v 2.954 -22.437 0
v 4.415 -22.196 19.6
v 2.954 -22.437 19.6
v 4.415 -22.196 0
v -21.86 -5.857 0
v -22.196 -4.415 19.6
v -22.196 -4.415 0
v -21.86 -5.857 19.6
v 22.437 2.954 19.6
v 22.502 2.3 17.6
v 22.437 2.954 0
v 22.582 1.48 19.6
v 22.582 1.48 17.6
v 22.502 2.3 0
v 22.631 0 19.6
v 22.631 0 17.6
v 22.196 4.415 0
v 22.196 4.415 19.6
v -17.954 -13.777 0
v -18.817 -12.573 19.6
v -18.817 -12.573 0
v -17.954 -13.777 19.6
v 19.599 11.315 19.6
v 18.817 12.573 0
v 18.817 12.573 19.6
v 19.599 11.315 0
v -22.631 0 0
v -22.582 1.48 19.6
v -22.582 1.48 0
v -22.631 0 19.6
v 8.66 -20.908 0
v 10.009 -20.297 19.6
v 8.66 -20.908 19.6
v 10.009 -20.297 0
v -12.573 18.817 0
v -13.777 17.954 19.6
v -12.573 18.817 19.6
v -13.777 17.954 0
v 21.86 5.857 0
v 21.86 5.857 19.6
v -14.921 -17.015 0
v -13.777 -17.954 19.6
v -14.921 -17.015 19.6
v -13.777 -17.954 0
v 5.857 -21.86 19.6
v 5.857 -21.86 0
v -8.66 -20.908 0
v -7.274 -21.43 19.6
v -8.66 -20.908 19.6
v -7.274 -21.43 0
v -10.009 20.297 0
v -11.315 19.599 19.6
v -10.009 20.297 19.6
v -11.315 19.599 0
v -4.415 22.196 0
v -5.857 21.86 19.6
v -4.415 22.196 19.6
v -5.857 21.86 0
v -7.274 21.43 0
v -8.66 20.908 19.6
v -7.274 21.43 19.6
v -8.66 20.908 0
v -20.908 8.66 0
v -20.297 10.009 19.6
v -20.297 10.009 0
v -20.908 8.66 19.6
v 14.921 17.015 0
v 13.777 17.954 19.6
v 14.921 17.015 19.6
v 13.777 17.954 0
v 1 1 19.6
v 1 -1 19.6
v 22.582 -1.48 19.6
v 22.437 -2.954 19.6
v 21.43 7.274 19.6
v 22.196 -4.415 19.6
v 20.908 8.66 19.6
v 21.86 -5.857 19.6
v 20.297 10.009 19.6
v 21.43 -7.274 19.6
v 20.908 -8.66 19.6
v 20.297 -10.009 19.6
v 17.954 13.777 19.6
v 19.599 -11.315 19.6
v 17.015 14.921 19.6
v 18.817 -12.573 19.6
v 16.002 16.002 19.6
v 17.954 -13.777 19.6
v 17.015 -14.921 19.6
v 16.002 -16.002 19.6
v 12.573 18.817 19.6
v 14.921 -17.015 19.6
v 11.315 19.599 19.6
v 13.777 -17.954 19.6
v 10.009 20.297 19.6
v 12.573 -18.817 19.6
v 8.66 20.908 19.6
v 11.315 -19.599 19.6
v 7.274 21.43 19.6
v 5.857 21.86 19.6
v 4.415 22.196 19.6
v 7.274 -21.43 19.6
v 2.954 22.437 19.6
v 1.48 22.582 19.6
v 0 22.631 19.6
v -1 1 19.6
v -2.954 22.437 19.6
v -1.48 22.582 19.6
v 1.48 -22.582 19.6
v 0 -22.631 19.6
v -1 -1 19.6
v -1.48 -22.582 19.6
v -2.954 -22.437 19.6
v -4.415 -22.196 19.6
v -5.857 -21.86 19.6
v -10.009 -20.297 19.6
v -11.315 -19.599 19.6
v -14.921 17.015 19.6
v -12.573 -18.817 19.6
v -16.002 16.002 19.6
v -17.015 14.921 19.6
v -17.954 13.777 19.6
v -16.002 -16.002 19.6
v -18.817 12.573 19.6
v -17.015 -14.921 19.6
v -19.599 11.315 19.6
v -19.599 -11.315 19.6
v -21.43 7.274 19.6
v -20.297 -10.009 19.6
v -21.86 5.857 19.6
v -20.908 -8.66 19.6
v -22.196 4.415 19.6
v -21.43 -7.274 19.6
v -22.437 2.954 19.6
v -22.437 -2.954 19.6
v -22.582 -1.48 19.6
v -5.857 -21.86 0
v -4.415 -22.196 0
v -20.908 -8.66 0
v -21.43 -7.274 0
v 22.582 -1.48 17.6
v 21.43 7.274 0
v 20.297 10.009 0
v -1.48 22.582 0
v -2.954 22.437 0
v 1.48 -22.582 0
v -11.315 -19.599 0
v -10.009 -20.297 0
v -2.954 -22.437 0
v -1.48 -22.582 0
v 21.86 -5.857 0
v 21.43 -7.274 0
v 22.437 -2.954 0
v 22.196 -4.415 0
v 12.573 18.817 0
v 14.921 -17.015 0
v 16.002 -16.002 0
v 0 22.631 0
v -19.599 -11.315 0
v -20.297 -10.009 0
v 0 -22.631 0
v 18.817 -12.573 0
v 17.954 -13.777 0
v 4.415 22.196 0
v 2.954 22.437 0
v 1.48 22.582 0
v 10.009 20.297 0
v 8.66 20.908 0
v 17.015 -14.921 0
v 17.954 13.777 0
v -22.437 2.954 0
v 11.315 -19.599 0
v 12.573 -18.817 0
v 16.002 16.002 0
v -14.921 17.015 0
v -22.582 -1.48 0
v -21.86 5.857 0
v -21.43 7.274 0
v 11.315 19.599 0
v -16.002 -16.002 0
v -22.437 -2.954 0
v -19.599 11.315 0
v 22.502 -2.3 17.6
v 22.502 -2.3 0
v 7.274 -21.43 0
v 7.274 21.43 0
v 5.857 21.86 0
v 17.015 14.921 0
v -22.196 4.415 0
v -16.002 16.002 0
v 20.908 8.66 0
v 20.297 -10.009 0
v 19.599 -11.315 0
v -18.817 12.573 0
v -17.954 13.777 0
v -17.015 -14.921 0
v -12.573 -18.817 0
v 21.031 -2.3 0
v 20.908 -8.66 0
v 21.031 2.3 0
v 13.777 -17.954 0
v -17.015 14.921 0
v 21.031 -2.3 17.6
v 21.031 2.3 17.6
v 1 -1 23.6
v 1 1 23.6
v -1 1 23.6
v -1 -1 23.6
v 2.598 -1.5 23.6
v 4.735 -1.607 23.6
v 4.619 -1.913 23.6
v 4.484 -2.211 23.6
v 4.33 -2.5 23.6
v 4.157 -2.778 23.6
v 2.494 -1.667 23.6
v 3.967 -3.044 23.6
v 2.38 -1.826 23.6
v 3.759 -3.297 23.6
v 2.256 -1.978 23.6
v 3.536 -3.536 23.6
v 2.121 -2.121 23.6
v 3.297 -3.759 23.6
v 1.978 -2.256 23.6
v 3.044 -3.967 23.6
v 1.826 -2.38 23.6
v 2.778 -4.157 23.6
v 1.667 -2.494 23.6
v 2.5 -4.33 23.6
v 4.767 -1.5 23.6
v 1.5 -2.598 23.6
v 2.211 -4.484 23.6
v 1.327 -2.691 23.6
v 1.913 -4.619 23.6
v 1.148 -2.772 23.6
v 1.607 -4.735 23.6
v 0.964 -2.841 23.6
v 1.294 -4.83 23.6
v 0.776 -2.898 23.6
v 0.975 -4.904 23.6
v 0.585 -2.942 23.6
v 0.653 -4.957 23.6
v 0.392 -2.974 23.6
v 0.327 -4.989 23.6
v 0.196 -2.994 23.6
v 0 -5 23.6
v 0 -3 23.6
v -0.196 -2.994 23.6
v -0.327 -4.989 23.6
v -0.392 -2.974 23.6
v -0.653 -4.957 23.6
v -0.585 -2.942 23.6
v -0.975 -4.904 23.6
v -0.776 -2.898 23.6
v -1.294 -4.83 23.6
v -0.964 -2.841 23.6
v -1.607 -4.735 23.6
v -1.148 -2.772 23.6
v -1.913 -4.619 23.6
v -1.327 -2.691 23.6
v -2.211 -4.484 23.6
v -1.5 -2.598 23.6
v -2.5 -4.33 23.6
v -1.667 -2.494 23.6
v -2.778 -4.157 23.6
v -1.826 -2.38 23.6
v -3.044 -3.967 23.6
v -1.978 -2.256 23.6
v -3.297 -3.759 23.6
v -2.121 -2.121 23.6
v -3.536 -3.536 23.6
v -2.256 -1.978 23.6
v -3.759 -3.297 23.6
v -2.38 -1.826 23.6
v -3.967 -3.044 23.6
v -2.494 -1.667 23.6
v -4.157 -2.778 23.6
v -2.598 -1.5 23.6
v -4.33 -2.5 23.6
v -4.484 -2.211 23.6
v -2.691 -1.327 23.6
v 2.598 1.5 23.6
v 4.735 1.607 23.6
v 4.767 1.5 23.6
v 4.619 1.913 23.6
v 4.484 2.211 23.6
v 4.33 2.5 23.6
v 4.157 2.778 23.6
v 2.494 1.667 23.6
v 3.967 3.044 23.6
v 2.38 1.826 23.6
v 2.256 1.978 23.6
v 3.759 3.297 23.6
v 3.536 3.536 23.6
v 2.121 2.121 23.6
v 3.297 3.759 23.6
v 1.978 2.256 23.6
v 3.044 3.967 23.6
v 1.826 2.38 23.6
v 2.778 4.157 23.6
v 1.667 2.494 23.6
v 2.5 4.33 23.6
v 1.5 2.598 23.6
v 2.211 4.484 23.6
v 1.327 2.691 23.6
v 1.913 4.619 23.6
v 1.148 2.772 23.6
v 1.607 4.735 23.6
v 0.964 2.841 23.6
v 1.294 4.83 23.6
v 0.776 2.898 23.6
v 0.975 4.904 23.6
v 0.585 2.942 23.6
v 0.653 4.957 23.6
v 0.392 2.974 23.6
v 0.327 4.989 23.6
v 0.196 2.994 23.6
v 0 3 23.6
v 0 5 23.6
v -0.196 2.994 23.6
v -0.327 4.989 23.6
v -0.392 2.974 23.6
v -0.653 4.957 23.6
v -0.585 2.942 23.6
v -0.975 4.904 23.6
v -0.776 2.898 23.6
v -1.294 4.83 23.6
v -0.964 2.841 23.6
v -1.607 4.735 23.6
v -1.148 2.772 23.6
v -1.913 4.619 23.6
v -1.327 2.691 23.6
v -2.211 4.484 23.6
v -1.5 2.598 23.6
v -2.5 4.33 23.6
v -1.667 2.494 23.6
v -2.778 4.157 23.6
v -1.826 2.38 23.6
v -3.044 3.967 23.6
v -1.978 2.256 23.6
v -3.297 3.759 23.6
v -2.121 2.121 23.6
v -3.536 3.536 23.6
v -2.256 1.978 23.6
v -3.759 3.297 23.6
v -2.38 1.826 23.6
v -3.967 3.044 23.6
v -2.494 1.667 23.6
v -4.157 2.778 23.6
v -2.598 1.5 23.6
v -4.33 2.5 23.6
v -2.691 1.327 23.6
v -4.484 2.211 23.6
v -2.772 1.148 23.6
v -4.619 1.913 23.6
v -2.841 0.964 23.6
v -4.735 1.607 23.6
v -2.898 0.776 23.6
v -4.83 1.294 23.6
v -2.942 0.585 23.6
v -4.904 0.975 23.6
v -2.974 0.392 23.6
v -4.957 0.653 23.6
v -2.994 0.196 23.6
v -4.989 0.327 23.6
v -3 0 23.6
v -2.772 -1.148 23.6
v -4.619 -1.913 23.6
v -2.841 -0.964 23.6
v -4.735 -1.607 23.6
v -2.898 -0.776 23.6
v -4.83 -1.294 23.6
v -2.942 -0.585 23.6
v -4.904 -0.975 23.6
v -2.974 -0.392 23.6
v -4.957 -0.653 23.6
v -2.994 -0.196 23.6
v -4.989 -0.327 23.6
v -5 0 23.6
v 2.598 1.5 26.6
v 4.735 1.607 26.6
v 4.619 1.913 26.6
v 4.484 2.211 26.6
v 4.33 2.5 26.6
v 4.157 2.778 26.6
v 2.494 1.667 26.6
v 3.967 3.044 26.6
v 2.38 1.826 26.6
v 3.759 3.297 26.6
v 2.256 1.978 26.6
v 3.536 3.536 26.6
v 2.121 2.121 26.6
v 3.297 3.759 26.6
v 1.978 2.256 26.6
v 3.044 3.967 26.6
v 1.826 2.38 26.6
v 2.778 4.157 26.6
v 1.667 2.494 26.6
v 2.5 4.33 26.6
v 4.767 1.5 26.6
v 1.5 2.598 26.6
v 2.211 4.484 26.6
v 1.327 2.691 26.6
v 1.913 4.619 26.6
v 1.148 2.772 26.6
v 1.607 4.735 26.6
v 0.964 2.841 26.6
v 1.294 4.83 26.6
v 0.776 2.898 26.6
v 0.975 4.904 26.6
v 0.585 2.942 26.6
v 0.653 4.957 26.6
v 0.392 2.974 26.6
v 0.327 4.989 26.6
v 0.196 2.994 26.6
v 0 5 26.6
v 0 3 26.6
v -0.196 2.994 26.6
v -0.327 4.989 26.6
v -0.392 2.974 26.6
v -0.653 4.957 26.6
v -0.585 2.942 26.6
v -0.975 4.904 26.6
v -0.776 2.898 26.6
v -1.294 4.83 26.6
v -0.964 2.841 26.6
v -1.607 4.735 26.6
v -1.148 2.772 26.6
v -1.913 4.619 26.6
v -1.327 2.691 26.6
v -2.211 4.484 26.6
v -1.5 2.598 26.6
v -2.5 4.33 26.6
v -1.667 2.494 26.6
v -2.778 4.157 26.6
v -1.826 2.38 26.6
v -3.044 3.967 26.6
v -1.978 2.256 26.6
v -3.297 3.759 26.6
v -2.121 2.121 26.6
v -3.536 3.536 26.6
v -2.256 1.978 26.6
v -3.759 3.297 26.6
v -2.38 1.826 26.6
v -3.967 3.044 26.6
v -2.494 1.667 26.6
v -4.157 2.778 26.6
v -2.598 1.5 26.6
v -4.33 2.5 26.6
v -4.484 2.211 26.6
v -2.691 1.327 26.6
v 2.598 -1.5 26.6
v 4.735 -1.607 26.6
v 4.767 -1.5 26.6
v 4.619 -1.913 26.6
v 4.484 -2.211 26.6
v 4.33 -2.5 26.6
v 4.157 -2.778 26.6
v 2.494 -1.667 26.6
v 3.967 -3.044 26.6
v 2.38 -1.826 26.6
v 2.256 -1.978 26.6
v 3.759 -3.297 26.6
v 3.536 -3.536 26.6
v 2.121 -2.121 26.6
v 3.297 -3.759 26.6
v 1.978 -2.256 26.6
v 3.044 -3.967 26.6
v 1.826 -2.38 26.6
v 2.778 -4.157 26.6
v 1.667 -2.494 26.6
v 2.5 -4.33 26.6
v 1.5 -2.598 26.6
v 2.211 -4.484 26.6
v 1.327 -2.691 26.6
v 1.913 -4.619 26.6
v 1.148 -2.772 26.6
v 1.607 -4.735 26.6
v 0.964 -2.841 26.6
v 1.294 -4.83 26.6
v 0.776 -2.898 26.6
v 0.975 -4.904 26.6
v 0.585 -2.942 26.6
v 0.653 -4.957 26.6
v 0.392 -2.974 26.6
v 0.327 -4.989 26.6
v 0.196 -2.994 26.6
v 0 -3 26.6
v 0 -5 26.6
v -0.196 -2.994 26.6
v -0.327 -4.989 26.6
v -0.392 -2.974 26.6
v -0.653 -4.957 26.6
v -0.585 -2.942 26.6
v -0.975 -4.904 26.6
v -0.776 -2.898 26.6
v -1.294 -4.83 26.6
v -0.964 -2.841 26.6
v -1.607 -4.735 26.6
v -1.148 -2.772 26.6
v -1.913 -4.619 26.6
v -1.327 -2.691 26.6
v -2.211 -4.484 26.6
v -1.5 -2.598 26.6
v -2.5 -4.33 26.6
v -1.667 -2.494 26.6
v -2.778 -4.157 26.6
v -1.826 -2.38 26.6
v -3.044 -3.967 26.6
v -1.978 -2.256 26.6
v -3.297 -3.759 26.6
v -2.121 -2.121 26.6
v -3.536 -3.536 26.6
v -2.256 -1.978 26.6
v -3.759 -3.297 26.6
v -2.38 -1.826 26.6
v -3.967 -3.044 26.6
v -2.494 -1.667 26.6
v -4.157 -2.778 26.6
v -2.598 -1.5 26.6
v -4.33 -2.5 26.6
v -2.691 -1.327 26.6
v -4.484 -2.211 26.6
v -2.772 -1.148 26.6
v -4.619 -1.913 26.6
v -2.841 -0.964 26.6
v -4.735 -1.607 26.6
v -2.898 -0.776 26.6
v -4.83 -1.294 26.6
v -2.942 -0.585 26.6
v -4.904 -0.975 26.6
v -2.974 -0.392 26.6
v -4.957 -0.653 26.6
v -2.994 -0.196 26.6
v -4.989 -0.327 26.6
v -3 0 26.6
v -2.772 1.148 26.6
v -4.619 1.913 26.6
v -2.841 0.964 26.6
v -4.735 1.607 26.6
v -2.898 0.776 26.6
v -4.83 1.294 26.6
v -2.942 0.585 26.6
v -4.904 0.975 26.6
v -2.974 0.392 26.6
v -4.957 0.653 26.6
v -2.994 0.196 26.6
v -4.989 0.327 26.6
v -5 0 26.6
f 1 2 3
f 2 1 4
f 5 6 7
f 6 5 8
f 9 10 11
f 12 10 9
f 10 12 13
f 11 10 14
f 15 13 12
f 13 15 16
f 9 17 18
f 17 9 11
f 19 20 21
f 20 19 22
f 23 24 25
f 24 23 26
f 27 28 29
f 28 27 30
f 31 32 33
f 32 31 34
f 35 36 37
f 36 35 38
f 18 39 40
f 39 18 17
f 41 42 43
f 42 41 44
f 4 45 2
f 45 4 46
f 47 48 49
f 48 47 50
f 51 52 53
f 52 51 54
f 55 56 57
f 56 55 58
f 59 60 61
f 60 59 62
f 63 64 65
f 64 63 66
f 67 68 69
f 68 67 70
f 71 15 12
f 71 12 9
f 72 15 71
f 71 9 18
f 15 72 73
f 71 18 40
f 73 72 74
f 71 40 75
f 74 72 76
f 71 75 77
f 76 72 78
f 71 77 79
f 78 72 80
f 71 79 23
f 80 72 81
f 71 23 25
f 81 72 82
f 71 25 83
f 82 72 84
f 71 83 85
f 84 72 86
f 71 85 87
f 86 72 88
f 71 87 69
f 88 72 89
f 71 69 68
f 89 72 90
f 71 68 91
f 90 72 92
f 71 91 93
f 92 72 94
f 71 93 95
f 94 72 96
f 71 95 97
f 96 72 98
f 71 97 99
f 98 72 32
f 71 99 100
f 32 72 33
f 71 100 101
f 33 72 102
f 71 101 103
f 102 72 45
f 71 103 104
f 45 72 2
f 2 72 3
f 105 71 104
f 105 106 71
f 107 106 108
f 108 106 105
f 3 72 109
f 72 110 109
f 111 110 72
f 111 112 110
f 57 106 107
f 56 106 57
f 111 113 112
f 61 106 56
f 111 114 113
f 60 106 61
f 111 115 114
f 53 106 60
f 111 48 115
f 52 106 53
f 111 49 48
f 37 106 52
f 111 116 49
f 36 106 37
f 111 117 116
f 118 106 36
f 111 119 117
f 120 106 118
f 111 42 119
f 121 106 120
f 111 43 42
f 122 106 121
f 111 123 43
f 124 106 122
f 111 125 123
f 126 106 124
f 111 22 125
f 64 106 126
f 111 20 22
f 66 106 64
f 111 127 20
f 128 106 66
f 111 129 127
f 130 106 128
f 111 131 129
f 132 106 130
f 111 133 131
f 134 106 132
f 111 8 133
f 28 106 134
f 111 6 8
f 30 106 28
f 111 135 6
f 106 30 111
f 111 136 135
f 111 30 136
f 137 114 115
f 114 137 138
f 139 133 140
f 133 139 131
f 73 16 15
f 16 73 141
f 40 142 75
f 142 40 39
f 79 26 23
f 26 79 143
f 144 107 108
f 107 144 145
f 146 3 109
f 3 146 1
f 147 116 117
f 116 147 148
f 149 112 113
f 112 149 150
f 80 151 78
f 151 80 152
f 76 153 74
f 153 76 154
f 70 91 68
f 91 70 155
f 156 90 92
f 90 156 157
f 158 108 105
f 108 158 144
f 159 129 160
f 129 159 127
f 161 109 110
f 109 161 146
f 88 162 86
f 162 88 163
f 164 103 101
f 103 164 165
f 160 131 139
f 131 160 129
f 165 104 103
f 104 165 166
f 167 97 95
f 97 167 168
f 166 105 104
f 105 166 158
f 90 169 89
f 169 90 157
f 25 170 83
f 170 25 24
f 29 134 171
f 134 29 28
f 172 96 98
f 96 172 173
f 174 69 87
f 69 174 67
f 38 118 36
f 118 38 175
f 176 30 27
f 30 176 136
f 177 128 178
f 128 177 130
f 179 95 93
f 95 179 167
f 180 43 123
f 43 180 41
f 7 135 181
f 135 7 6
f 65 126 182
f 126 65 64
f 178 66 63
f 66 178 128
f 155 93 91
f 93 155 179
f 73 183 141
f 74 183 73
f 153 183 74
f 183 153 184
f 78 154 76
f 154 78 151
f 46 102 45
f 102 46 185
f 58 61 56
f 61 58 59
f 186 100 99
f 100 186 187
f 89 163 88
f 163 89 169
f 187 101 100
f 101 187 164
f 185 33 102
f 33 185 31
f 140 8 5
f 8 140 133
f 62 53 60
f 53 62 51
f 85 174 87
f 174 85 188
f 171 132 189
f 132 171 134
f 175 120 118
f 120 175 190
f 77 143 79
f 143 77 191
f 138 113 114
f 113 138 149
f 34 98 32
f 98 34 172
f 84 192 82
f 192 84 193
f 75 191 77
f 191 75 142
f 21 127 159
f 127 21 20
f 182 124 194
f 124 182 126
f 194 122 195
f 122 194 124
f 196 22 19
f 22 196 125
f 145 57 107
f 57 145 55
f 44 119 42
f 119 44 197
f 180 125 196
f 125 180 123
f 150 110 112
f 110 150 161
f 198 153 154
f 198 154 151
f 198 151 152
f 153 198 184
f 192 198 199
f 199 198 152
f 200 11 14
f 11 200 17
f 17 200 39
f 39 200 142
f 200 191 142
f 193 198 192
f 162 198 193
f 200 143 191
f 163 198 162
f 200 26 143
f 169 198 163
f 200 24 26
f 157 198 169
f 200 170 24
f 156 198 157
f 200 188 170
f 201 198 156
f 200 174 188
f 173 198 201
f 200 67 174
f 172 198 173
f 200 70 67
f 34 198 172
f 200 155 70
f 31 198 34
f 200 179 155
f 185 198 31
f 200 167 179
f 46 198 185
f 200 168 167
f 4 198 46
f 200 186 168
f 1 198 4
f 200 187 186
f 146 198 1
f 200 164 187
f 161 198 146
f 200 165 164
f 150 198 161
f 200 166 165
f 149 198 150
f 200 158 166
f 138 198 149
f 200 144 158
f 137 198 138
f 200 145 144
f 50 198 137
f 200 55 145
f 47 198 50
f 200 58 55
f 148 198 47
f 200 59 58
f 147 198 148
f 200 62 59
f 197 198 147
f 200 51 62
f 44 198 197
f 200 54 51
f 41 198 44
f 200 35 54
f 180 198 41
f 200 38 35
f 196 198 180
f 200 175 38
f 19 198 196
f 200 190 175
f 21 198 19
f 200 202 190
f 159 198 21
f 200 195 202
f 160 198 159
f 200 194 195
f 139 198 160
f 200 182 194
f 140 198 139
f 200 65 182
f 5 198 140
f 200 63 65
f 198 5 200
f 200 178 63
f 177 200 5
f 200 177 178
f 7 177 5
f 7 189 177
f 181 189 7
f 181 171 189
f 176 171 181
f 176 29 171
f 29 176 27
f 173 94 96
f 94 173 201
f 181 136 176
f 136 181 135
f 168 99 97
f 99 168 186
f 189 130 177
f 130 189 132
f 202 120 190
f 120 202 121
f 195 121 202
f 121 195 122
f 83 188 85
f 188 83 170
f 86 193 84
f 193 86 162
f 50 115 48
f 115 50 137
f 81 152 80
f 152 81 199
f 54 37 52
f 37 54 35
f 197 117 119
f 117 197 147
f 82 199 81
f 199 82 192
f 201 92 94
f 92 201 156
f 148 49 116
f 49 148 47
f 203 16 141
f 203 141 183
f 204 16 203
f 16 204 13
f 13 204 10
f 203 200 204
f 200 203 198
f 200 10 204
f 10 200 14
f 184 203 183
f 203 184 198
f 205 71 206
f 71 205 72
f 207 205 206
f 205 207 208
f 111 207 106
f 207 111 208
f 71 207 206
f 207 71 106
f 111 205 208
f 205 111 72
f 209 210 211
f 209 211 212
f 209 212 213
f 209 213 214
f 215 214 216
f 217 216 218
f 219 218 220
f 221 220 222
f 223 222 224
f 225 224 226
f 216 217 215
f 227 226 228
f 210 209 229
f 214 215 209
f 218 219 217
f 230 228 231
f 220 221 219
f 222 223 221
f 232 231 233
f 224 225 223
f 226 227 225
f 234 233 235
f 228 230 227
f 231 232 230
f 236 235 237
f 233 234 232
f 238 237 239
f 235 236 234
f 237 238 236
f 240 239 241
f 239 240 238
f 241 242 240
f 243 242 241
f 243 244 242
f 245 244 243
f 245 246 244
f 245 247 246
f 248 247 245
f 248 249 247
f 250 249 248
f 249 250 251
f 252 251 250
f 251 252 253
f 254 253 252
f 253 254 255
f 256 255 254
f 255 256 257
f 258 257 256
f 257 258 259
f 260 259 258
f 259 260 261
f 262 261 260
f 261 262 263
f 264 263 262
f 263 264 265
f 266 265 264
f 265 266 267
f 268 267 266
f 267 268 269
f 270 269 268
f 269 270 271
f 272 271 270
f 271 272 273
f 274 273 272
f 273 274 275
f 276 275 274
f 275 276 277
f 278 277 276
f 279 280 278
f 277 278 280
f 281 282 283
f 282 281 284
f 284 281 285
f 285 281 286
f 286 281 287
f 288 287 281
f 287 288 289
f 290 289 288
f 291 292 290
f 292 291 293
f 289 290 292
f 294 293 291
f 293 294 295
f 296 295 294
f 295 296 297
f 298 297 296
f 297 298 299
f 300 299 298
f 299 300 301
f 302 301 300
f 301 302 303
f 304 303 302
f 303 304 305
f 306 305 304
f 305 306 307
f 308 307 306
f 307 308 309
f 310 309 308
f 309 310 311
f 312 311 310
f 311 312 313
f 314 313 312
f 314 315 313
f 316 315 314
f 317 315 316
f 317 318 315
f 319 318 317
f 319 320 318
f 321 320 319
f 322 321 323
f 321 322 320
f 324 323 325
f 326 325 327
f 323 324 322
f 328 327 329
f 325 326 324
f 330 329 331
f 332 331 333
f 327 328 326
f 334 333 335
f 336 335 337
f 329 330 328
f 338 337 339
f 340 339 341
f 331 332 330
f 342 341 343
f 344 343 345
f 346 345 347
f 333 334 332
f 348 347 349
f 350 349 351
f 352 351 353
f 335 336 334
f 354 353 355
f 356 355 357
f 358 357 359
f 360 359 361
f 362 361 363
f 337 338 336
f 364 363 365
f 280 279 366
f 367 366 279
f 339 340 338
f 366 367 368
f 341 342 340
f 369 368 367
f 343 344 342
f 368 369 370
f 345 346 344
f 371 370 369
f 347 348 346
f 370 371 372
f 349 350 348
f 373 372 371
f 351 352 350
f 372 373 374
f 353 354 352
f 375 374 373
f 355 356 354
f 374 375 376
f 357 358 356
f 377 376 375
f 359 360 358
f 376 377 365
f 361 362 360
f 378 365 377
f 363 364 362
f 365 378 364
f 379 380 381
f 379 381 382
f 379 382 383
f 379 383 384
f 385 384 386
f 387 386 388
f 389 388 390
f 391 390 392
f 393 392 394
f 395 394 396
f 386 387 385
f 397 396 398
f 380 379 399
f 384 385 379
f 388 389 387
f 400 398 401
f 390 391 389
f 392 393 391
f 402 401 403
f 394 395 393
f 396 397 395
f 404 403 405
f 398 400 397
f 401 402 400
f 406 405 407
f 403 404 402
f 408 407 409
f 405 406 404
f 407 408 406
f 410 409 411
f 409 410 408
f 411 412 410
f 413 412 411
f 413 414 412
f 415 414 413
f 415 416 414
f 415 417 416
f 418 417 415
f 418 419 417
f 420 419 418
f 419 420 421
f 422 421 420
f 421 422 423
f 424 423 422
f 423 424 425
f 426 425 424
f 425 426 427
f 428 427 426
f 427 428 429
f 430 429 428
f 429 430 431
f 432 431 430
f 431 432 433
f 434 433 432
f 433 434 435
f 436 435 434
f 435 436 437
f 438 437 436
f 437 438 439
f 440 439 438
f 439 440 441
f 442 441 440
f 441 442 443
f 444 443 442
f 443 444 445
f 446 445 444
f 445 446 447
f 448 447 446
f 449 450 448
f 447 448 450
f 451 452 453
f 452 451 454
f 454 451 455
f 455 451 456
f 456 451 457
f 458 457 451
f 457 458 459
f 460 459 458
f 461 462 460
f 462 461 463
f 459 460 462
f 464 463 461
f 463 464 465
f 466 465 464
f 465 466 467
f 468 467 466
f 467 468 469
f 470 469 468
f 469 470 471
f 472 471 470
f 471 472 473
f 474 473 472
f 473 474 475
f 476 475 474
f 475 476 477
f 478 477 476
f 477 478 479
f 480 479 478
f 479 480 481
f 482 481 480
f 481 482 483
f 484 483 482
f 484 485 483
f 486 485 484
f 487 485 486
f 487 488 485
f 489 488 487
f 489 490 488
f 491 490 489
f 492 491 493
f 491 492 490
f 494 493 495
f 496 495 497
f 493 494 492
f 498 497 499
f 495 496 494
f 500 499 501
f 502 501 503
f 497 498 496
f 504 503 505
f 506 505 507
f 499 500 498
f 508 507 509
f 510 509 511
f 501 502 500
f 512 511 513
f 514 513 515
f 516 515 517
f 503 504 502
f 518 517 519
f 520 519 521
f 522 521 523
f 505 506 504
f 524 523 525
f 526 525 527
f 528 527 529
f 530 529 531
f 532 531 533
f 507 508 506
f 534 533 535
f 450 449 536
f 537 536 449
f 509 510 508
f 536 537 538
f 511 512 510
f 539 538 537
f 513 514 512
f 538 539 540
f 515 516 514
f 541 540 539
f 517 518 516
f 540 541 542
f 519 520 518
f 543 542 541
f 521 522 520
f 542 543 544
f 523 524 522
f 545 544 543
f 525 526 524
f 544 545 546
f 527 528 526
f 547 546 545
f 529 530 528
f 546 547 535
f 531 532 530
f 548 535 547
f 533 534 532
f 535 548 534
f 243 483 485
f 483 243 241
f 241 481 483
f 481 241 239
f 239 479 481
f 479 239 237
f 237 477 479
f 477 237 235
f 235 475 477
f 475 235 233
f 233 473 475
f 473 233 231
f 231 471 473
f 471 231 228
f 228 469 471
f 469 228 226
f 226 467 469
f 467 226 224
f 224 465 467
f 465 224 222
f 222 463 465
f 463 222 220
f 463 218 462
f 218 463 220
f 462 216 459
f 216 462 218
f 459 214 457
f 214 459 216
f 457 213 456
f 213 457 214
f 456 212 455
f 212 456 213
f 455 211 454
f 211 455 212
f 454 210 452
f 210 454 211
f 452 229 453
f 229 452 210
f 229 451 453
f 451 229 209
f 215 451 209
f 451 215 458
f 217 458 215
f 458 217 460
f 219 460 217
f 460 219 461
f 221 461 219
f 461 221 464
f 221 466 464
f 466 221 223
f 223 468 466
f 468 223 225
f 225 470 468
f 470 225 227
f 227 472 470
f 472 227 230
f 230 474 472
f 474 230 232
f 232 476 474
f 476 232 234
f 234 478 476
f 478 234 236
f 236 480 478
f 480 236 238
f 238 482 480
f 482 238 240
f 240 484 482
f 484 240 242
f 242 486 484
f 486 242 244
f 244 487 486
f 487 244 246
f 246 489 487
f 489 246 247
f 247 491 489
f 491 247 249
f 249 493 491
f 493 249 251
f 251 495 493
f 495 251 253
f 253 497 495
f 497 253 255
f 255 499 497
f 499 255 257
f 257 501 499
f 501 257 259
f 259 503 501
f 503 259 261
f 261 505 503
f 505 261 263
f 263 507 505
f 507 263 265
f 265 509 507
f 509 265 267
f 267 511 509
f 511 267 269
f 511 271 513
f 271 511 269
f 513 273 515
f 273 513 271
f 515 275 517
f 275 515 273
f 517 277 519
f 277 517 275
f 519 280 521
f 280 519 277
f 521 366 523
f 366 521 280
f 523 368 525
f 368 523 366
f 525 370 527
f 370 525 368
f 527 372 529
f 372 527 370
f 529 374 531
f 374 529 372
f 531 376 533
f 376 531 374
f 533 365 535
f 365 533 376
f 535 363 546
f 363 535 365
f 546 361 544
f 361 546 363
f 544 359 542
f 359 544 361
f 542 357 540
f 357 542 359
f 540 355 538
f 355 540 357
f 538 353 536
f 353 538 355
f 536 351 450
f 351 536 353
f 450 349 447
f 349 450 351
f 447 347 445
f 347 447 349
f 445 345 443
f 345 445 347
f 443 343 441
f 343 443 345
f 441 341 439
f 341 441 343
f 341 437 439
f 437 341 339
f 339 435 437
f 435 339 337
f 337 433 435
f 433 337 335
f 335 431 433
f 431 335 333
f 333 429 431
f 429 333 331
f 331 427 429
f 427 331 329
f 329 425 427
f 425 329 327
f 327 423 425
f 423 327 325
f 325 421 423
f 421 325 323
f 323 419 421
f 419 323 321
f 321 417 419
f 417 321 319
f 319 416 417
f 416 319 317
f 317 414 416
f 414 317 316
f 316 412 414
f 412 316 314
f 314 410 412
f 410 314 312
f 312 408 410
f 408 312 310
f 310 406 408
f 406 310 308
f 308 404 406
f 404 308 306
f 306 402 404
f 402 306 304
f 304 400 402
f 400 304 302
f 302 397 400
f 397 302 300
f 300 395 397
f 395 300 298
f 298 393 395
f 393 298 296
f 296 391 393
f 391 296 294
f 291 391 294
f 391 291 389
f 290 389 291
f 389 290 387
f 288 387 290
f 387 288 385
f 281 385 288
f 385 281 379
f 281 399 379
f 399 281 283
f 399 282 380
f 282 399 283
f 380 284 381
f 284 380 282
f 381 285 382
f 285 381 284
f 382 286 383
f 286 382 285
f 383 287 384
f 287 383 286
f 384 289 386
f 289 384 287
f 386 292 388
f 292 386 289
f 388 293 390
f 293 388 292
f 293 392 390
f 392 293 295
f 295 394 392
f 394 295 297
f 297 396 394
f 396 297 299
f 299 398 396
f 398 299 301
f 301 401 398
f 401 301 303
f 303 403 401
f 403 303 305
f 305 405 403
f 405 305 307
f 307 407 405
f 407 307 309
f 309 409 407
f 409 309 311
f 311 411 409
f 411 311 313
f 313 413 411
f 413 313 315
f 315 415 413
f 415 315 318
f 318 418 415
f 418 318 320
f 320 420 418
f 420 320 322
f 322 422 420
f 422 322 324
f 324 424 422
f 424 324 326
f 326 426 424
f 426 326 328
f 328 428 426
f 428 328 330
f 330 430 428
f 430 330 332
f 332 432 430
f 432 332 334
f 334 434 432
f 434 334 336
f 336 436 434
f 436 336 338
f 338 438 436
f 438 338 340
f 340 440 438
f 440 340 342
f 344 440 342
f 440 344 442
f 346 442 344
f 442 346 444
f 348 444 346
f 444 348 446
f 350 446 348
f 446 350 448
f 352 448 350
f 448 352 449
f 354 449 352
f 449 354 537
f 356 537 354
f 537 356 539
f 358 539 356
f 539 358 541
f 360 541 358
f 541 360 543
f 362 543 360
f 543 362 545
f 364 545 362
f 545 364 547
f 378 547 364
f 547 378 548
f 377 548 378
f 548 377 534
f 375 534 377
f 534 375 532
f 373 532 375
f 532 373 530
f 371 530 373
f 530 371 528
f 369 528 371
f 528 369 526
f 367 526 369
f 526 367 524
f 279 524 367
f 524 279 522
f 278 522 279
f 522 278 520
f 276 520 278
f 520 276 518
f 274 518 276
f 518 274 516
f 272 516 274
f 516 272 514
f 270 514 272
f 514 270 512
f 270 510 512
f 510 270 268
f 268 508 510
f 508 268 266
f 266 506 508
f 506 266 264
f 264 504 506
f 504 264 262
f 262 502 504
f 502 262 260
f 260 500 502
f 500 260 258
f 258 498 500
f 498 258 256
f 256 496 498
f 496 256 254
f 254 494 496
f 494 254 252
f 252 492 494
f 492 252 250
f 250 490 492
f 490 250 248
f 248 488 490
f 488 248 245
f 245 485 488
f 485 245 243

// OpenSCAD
// Tömör, hengeres beleülő betét a mehsejt_tarolo.scad modellhez
// - Oldalt alulról induló egyszerű vájat a bütyök becsúszásához
// - Felül kis C-alakú horog kulcskarika számára

// A tároló alap paraméterei (illesztéshez)
sejt_oldalhossz = 30;      // mm
falvastagsag = 3;          // mm
fakk_melyseg = 20;         // mm

// Betét illesztése
illesztesi_hezag = 0.35;   // mm
also_hezag = 0.4;          // mm

// Bütyök a tartóban: félgömb r=2 mm -> d=4 mm
butyok_sugar = 2;          // mm
vajat_szelesseg = 4.6;     // mm
vajat_melyseg = 1.6;       // mm
vajat_felso_maradek = 2.0; // mm, ennyi maradjon zártan a tetején

// Felső horog
horog_kulso_sugar = 5.0;   // mm
horog_anyag = 2.0;         // mm
horog_magassag = 3.0;      // mm
horog_nyas_szelesseg = 3.0;// mm
horog_tarto_magassag = 4.0;// mm

$fn = 96;

fakk_sugar = sejt_oldalhossz * sqrt(3) / 2 - falvastagsag;
kulso_sugar = fakk_sugar - illesztesi_hezag;
betet_magassag = fakk_melyseg - also_hezag;

module oldalso_vajat() {
    // Egyszerű, alul nyitott vájat a +X oldalon.
    vajat_magassag = betet_magassag - vajat_felso_maradek;

    translate([kulso_sugar - vajat_melyseg, -vajat_szelesseg / 2, 0])
        cube([vajat_melyseg + 1.0, vajat_szelesseg, vajat_magassag]);
}

module felso_horog() {
    // Tartónyak a horoghoz
    translate([-horog_anyag / 2, -horog_anyag / 2, betet_magassag])
        cube([horog_anyag, horog_anyag, horog_tarto_magassag]);

    // C-alakú horogtest
    translate([0, 0, betet_magassag + horog_tarto_magassag])
        linear_extrude(height = horog_magassag)
            difference() {
                circle(r = horog_kulso_sugar);
                circle(r = horog_kulso_sugar - horog_anyag);

                // Nyílás a C-horoghoz
                translate([horog_kulso_sugar * 0.55, 0])
                    square([horog_kulso_sugar, horog_nyas_szelesseg], center = true);
            }
}

module beulo_betet() {
    union() {
        difference() {
            // Tömör hengeres betét
            cylinder(h = betet_magassag, r = kulso_sugar);

            // Oldalsó alul induló vájat
            oldalso_vajat();
        }

        // Felső horog
        felso_horog();
    }
}

if (vajat_szelesseg < 2 * butyok_sugar)
    echo("FIGYELEM: A vájat keskenyebb, mint a bütyök átmérője.");

beulo_betet();
